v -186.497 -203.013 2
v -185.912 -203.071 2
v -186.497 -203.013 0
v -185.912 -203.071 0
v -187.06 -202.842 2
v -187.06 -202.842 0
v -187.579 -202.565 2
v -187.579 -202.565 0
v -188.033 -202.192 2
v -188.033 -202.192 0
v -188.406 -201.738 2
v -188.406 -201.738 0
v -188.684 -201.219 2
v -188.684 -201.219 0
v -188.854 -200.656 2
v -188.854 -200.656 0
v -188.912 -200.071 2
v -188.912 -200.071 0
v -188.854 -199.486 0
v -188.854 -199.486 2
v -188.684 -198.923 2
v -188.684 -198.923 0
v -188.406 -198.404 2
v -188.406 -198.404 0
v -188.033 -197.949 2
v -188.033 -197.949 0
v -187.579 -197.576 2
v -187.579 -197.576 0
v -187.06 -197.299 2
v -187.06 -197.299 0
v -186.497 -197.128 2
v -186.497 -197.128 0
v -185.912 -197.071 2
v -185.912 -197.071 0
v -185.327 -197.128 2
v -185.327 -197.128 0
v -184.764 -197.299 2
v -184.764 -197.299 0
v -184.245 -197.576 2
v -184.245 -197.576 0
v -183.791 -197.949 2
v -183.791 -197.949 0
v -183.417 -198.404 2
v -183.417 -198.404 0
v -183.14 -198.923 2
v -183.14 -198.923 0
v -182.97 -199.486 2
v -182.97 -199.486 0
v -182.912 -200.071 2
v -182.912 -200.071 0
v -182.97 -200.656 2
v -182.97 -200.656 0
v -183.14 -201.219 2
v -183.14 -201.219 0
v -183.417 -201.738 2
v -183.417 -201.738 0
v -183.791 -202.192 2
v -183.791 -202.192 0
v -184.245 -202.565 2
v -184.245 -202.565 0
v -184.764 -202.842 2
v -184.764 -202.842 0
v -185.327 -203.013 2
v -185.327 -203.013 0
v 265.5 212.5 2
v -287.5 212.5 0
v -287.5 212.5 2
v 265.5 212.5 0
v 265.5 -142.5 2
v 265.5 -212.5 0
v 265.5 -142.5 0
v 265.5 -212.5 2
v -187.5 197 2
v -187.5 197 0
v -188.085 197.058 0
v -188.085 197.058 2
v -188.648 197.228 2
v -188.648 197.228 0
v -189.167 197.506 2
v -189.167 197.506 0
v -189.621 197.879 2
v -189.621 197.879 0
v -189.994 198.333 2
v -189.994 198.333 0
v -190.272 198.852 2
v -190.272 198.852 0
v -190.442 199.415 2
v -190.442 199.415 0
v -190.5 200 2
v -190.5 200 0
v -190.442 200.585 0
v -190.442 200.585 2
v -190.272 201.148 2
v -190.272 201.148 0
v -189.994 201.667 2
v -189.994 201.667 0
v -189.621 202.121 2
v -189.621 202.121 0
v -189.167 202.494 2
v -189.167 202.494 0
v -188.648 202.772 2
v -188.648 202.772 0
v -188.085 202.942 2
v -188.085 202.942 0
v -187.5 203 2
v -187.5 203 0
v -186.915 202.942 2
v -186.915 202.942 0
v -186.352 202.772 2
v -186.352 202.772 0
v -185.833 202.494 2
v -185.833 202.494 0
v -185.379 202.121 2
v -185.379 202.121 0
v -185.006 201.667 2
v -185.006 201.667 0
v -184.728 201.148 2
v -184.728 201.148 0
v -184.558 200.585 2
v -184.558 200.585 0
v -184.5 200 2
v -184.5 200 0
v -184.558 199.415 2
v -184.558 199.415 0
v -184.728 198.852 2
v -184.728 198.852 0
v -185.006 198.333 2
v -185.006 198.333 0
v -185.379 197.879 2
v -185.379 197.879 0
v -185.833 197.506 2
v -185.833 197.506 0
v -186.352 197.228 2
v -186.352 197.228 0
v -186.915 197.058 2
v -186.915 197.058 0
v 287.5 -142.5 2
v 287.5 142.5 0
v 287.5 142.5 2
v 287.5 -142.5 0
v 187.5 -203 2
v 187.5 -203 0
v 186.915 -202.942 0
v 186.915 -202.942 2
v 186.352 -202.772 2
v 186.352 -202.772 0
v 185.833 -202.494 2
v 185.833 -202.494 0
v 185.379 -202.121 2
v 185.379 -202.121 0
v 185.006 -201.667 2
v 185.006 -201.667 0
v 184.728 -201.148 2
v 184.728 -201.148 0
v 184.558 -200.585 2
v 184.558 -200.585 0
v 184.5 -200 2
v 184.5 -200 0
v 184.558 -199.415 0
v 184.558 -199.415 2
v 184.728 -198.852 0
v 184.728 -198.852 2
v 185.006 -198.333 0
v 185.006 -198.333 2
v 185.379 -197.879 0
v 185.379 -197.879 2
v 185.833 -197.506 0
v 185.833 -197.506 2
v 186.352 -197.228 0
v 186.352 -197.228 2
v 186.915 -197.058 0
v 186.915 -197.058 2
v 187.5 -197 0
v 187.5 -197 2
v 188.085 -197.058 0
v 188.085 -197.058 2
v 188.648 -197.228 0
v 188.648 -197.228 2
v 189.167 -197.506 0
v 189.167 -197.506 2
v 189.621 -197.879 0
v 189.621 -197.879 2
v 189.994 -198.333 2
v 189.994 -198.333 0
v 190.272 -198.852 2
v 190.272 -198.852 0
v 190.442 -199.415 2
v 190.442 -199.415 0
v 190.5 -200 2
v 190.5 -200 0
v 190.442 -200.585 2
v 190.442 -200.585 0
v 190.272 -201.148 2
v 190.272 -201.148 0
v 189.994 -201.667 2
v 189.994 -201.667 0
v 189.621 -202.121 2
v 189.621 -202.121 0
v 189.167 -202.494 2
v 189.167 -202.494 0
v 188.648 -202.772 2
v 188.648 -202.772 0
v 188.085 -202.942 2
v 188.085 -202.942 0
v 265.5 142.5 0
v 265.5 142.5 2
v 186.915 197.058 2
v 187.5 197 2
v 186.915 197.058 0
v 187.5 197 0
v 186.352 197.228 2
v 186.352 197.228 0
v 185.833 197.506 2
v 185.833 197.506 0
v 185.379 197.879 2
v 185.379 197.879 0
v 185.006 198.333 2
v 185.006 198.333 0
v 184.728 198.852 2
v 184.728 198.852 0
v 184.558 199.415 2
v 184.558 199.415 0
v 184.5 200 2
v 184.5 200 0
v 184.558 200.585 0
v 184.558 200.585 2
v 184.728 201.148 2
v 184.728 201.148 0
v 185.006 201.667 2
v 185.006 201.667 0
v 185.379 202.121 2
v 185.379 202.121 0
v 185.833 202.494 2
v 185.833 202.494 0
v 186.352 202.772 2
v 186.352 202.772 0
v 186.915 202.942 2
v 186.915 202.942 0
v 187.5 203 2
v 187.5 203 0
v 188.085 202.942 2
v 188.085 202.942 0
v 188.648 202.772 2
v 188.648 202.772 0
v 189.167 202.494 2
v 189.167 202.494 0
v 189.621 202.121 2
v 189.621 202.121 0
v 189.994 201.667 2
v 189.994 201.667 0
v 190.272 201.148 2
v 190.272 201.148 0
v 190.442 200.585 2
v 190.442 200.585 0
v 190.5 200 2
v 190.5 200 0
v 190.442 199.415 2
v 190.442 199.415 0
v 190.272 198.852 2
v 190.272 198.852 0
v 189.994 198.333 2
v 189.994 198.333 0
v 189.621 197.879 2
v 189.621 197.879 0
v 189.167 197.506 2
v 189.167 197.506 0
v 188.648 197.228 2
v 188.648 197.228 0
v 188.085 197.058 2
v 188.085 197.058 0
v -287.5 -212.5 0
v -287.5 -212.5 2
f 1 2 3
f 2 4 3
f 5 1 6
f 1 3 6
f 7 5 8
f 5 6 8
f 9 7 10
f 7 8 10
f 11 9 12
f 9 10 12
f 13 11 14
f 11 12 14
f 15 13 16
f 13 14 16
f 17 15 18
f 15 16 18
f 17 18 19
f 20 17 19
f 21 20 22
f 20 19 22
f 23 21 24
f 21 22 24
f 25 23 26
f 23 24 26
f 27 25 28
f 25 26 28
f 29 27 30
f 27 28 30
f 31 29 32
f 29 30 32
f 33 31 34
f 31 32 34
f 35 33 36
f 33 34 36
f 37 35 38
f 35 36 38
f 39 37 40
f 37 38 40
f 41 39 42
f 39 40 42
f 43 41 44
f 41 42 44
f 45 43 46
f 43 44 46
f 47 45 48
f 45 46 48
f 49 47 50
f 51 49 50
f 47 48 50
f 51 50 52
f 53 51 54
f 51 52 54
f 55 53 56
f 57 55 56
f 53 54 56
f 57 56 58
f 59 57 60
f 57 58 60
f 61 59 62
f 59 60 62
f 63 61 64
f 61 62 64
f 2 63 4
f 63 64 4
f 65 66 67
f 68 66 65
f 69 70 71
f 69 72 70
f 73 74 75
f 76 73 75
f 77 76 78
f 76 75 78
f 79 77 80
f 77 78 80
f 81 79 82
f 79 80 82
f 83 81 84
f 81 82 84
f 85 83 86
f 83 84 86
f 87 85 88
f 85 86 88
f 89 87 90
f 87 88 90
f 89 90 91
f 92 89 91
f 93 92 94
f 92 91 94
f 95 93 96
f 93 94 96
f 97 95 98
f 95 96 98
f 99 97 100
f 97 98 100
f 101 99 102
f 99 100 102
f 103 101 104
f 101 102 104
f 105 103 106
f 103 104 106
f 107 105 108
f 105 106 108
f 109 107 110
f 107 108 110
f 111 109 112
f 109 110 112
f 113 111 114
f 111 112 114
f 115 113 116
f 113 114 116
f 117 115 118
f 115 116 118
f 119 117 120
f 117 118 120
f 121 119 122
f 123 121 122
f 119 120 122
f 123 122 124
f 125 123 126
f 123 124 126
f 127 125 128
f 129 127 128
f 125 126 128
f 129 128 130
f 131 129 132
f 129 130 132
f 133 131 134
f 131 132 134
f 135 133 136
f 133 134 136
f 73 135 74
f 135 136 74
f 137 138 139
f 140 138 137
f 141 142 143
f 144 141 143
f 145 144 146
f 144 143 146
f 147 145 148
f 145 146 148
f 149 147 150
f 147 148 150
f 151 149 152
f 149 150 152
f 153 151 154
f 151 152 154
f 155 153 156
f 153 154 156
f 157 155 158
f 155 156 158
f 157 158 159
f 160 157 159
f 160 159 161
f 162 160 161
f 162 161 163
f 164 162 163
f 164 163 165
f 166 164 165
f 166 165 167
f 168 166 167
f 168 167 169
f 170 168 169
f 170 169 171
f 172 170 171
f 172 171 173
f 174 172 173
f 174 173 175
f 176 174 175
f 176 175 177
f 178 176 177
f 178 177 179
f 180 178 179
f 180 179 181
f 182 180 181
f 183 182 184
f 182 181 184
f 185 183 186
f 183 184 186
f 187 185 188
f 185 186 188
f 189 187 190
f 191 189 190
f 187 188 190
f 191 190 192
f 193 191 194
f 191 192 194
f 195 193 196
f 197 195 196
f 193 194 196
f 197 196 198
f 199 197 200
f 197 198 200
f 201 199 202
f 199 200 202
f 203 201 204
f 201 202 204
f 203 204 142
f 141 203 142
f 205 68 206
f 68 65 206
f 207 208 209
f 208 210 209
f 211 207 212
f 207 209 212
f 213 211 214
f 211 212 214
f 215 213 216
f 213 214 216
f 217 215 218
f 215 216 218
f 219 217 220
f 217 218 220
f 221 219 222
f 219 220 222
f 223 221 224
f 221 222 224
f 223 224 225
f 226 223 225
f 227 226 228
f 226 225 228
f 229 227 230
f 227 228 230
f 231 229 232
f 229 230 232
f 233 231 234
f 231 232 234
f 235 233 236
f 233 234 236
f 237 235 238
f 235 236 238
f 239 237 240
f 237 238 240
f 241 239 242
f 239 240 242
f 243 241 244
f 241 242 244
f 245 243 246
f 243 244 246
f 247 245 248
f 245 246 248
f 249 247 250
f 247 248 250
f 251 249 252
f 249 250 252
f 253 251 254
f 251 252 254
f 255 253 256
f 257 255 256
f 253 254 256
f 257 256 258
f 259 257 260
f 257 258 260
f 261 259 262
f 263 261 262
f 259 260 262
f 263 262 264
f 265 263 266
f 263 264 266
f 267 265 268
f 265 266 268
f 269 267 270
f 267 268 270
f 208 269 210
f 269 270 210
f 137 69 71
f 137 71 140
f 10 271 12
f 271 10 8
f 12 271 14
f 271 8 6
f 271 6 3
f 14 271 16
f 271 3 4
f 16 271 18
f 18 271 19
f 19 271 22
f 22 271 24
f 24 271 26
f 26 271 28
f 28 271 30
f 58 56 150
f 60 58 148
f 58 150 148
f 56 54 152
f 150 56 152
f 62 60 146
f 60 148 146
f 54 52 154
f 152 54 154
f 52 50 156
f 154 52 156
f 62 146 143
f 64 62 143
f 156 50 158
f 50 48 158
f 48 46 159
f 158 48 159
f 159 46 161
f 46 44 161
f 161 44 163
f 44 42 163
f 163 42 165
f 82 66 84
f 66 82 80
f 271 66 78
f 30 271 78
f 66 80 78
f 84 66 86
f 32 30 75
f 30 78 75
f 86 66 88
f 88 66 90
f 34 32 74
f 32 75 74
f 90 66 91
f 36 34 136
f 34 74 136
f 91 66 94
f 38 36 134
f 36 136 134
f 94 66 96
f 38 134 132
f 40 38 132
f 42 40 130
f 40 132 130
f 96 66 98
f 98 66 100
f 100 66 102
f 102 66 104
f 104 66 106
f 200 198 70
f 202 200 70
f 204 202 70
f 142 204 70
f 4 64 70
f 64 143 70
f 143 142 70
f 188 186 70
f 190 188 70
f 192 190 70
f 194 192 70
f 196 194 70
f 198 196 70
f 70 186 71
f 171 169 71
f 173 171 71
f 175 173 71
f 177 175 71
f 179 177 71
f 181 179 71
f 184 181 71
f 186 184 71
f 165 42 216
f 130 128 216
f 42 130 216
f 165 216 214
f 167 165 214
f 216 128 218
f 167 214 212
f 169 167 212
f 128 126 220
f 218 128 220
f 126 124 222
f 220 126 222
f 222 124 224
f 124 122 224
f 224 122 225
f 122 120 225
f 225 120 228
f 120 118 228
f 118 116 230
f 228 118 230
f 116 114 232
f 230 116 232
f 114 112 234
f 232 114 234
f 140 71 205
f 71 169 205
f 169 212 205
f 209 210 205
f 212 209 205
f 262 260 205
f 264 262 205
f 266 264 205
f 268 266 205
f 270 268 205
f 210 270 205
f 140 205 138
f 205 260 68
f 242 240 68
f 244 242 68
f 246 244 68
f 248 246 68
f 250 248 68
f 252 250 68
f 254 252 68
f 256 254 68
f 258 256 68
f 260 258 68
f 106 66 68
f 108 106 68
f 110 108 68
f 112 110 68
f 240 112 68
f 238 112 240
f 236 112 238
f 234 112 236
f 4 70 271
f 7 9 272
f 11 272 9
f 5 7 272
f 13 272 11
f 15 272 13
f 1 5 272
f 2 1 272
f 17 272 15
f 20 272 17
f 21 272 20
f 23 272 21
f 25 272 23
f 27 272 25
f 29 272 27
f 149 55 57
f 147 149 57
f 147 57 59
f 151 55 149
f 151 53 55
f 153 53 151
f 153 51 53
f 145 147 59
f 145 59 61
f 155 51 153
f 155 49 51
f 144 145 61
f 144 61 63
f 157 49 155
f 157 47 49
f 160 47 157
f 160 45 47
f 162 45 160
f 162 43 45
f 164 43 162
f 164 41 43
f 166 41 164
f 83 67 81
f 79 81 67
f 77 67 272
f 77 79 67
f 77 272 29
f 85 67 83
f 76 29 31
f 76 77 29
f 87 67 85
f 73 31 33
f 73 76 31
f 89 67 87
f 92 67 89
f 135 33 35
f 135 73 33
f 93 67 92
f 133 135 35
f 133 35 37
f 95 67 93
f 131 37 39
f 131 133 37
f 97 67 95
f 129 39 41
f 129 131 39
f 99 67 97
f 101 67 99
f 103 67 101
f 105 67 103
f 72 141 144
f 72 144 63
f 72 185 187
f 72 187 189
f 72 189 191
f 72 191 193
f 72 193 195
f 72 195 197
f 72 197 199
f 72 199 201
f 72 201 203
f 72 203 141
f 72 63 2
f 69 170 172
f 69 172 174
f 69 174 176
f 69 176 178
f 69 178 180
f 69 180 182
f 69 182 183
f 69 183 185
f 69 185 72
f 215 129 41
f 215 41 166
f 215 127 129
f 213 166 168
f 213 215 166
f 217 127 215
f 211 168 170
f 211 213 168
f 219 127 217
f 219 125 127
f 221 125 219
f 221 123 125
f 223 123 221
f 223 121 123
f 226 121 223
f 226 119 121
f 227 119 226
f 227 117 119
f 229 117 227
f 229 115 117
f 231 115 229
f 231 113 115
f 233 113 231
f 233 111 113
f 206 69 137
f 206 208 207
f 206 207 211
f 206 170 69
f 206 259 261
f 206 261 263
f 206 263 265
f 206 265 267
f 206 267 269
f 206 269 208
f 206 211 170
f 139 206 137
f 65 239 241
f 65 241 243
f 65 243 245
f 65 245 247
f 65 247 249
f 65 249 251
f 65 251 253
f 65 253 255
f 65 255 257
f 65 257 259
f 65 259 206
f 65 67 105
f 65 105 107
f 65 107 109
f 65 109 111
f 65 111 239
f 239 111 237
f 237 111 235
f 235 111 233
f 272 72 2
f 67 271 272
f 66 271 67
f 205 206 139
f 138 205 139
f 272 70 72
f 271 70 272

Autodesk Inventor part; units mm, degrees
ref_plane "YZ Plane" through (0, 0, 0) normal (1, 0, 0) x (0, 1, 0)
ref_plane "XZ Plane" through (0, 0, 0) normal (0, 1, 0) x (-1, 0, 0)
ref_plane "XY Plane" through (0, 0, 0) normal (0, 0, 1) x (1, 0, 0)
sketch "Sketch2" plane through (0, 0, 0) normal (0, 0, 1) x (1, 0, 0)
  line L0 (0, 297.5) -> (0, -297.5) construction
  line L1 (-402.5, 0) -> (402.5, 0) construction
  line L2 (-287.5, 212.5) -> (287.5, 212.5)
  line L3 (287.5, 212.5) -> (287.5, -212.5)
  line L4 (287.5, -212.5) -> (-287.5, -212.5)
  line L5 (-287.5, -212.5) -> (-287.5, 212.5)
  point P0 (0, 0)
  dimension "d0" = 425
  dimension "d1" = 575
extrude "Extrusion1" add sketch "Sketch2" along normal blind 2
sketch "Sketch3" plane through (0, 0, 2) normal (0, 0, 1) x (1, 0, 0)
  line L0 (287.5, 212.5) -> (-287.5, 212.5) construction
  line L1 (-287.5, 212.5) -> (-287.5, -212.5) construction
  line L2 (-287.5, -212.5) -> (287.5, -212.5) construction
  line L3 (287.5, -212.5) -> (287.5, 212.5) construction
  line L4 (287.5, 212.5) -> (-287.5, 212.5) projected
  line L5 (287.5, 212.5) -> (265.5, 212.5)
  line L6 (265.5, 212.5) -> (265.5, 142.5)
  line L7 (265.5, 142.5) -> (287.5, 142.5)
  line L8 (287.5, 142.5) -> (287.5, 212.5)
  line L9 (287.5, -212.5) -> (265.5, -212.5)
  line L10 (265.5, -212.5) -> (265.5, -142.5)
  line L11 (265.5, -142.5) -> (287.5, -142.5)
  line L12 (287.5, -142.5) -> (287.5, -212.5)
  point P0 (0, 0)
  dimension "d4" = 22
  dimension "d5" = 70
  dimension "d6" = 70
extrude "Extrusion2" cut sketch "Sketch3" against normal blind 2
sketch "Sketch4" plane through (0, 0, 2) normal (0, 0, 1) x (1, 0, 0)
  line L0 (265.5, 142.5) -> (265.5, 212.5) construction
  line L1 (265.5, 212.5) -> (-287.5, 212.5) construction
  line L2 (-287.5, 212.5) -> (-287.5, -212.5) construction
  line L3 (-287.5, -212.5) -> (265.5, -212.5) construction
  line L4 (265.5, -212.5) -> (265.5, -142.5) construction
  line L5 (265.5, -142.5) -> (287.5, -142.5) construction
  line L6 (287.5, -142.5) -> (287.5, 142.5) construction
  line L7 (287.5, 142.5) -> (265.5, 142.5) construction
  line L8 (265.5, 142.5) -> (265.5, 212.5) construction
  line L9 (265.5, 200) -> (-287.5, 200) construction
  line L10 (-287.5, 212.5) -> (265.5, 212.5) construction
  line L11 (-268.0097, 212.5) -> (-268.0097, -212.5) construction
  line L12 (-287.5, -212.5) -> (265.5, -212.5) construction
  line L13 (-287.5, -200) -> (265.5, -200) construction
  point P0 (0, 0)
  point P1 (187.5, 200)
  point P2 (-187.5, 200)
  point P3 (-187.5, -200)
  point P4 (187.5, -200)
  point P5 (-185.9119, -200.0708)
  dimension "d9" = 12.5
  dimension "d10" = 12.5
  dimension "d11" = 100
  dimension "d12" = 100
  dimension "d13" = 100
  dimension "d14" = 100
hole "Hole1" at (-187.5, 200, 2) at (187.5, 200, 2) at (187.5, -200, 2) at (-185.9119, -200.0708, 2) direction (0, 0, -1) diameter 6 depth 10 tip angle 118
properties part number "Top_Cover_V1"
